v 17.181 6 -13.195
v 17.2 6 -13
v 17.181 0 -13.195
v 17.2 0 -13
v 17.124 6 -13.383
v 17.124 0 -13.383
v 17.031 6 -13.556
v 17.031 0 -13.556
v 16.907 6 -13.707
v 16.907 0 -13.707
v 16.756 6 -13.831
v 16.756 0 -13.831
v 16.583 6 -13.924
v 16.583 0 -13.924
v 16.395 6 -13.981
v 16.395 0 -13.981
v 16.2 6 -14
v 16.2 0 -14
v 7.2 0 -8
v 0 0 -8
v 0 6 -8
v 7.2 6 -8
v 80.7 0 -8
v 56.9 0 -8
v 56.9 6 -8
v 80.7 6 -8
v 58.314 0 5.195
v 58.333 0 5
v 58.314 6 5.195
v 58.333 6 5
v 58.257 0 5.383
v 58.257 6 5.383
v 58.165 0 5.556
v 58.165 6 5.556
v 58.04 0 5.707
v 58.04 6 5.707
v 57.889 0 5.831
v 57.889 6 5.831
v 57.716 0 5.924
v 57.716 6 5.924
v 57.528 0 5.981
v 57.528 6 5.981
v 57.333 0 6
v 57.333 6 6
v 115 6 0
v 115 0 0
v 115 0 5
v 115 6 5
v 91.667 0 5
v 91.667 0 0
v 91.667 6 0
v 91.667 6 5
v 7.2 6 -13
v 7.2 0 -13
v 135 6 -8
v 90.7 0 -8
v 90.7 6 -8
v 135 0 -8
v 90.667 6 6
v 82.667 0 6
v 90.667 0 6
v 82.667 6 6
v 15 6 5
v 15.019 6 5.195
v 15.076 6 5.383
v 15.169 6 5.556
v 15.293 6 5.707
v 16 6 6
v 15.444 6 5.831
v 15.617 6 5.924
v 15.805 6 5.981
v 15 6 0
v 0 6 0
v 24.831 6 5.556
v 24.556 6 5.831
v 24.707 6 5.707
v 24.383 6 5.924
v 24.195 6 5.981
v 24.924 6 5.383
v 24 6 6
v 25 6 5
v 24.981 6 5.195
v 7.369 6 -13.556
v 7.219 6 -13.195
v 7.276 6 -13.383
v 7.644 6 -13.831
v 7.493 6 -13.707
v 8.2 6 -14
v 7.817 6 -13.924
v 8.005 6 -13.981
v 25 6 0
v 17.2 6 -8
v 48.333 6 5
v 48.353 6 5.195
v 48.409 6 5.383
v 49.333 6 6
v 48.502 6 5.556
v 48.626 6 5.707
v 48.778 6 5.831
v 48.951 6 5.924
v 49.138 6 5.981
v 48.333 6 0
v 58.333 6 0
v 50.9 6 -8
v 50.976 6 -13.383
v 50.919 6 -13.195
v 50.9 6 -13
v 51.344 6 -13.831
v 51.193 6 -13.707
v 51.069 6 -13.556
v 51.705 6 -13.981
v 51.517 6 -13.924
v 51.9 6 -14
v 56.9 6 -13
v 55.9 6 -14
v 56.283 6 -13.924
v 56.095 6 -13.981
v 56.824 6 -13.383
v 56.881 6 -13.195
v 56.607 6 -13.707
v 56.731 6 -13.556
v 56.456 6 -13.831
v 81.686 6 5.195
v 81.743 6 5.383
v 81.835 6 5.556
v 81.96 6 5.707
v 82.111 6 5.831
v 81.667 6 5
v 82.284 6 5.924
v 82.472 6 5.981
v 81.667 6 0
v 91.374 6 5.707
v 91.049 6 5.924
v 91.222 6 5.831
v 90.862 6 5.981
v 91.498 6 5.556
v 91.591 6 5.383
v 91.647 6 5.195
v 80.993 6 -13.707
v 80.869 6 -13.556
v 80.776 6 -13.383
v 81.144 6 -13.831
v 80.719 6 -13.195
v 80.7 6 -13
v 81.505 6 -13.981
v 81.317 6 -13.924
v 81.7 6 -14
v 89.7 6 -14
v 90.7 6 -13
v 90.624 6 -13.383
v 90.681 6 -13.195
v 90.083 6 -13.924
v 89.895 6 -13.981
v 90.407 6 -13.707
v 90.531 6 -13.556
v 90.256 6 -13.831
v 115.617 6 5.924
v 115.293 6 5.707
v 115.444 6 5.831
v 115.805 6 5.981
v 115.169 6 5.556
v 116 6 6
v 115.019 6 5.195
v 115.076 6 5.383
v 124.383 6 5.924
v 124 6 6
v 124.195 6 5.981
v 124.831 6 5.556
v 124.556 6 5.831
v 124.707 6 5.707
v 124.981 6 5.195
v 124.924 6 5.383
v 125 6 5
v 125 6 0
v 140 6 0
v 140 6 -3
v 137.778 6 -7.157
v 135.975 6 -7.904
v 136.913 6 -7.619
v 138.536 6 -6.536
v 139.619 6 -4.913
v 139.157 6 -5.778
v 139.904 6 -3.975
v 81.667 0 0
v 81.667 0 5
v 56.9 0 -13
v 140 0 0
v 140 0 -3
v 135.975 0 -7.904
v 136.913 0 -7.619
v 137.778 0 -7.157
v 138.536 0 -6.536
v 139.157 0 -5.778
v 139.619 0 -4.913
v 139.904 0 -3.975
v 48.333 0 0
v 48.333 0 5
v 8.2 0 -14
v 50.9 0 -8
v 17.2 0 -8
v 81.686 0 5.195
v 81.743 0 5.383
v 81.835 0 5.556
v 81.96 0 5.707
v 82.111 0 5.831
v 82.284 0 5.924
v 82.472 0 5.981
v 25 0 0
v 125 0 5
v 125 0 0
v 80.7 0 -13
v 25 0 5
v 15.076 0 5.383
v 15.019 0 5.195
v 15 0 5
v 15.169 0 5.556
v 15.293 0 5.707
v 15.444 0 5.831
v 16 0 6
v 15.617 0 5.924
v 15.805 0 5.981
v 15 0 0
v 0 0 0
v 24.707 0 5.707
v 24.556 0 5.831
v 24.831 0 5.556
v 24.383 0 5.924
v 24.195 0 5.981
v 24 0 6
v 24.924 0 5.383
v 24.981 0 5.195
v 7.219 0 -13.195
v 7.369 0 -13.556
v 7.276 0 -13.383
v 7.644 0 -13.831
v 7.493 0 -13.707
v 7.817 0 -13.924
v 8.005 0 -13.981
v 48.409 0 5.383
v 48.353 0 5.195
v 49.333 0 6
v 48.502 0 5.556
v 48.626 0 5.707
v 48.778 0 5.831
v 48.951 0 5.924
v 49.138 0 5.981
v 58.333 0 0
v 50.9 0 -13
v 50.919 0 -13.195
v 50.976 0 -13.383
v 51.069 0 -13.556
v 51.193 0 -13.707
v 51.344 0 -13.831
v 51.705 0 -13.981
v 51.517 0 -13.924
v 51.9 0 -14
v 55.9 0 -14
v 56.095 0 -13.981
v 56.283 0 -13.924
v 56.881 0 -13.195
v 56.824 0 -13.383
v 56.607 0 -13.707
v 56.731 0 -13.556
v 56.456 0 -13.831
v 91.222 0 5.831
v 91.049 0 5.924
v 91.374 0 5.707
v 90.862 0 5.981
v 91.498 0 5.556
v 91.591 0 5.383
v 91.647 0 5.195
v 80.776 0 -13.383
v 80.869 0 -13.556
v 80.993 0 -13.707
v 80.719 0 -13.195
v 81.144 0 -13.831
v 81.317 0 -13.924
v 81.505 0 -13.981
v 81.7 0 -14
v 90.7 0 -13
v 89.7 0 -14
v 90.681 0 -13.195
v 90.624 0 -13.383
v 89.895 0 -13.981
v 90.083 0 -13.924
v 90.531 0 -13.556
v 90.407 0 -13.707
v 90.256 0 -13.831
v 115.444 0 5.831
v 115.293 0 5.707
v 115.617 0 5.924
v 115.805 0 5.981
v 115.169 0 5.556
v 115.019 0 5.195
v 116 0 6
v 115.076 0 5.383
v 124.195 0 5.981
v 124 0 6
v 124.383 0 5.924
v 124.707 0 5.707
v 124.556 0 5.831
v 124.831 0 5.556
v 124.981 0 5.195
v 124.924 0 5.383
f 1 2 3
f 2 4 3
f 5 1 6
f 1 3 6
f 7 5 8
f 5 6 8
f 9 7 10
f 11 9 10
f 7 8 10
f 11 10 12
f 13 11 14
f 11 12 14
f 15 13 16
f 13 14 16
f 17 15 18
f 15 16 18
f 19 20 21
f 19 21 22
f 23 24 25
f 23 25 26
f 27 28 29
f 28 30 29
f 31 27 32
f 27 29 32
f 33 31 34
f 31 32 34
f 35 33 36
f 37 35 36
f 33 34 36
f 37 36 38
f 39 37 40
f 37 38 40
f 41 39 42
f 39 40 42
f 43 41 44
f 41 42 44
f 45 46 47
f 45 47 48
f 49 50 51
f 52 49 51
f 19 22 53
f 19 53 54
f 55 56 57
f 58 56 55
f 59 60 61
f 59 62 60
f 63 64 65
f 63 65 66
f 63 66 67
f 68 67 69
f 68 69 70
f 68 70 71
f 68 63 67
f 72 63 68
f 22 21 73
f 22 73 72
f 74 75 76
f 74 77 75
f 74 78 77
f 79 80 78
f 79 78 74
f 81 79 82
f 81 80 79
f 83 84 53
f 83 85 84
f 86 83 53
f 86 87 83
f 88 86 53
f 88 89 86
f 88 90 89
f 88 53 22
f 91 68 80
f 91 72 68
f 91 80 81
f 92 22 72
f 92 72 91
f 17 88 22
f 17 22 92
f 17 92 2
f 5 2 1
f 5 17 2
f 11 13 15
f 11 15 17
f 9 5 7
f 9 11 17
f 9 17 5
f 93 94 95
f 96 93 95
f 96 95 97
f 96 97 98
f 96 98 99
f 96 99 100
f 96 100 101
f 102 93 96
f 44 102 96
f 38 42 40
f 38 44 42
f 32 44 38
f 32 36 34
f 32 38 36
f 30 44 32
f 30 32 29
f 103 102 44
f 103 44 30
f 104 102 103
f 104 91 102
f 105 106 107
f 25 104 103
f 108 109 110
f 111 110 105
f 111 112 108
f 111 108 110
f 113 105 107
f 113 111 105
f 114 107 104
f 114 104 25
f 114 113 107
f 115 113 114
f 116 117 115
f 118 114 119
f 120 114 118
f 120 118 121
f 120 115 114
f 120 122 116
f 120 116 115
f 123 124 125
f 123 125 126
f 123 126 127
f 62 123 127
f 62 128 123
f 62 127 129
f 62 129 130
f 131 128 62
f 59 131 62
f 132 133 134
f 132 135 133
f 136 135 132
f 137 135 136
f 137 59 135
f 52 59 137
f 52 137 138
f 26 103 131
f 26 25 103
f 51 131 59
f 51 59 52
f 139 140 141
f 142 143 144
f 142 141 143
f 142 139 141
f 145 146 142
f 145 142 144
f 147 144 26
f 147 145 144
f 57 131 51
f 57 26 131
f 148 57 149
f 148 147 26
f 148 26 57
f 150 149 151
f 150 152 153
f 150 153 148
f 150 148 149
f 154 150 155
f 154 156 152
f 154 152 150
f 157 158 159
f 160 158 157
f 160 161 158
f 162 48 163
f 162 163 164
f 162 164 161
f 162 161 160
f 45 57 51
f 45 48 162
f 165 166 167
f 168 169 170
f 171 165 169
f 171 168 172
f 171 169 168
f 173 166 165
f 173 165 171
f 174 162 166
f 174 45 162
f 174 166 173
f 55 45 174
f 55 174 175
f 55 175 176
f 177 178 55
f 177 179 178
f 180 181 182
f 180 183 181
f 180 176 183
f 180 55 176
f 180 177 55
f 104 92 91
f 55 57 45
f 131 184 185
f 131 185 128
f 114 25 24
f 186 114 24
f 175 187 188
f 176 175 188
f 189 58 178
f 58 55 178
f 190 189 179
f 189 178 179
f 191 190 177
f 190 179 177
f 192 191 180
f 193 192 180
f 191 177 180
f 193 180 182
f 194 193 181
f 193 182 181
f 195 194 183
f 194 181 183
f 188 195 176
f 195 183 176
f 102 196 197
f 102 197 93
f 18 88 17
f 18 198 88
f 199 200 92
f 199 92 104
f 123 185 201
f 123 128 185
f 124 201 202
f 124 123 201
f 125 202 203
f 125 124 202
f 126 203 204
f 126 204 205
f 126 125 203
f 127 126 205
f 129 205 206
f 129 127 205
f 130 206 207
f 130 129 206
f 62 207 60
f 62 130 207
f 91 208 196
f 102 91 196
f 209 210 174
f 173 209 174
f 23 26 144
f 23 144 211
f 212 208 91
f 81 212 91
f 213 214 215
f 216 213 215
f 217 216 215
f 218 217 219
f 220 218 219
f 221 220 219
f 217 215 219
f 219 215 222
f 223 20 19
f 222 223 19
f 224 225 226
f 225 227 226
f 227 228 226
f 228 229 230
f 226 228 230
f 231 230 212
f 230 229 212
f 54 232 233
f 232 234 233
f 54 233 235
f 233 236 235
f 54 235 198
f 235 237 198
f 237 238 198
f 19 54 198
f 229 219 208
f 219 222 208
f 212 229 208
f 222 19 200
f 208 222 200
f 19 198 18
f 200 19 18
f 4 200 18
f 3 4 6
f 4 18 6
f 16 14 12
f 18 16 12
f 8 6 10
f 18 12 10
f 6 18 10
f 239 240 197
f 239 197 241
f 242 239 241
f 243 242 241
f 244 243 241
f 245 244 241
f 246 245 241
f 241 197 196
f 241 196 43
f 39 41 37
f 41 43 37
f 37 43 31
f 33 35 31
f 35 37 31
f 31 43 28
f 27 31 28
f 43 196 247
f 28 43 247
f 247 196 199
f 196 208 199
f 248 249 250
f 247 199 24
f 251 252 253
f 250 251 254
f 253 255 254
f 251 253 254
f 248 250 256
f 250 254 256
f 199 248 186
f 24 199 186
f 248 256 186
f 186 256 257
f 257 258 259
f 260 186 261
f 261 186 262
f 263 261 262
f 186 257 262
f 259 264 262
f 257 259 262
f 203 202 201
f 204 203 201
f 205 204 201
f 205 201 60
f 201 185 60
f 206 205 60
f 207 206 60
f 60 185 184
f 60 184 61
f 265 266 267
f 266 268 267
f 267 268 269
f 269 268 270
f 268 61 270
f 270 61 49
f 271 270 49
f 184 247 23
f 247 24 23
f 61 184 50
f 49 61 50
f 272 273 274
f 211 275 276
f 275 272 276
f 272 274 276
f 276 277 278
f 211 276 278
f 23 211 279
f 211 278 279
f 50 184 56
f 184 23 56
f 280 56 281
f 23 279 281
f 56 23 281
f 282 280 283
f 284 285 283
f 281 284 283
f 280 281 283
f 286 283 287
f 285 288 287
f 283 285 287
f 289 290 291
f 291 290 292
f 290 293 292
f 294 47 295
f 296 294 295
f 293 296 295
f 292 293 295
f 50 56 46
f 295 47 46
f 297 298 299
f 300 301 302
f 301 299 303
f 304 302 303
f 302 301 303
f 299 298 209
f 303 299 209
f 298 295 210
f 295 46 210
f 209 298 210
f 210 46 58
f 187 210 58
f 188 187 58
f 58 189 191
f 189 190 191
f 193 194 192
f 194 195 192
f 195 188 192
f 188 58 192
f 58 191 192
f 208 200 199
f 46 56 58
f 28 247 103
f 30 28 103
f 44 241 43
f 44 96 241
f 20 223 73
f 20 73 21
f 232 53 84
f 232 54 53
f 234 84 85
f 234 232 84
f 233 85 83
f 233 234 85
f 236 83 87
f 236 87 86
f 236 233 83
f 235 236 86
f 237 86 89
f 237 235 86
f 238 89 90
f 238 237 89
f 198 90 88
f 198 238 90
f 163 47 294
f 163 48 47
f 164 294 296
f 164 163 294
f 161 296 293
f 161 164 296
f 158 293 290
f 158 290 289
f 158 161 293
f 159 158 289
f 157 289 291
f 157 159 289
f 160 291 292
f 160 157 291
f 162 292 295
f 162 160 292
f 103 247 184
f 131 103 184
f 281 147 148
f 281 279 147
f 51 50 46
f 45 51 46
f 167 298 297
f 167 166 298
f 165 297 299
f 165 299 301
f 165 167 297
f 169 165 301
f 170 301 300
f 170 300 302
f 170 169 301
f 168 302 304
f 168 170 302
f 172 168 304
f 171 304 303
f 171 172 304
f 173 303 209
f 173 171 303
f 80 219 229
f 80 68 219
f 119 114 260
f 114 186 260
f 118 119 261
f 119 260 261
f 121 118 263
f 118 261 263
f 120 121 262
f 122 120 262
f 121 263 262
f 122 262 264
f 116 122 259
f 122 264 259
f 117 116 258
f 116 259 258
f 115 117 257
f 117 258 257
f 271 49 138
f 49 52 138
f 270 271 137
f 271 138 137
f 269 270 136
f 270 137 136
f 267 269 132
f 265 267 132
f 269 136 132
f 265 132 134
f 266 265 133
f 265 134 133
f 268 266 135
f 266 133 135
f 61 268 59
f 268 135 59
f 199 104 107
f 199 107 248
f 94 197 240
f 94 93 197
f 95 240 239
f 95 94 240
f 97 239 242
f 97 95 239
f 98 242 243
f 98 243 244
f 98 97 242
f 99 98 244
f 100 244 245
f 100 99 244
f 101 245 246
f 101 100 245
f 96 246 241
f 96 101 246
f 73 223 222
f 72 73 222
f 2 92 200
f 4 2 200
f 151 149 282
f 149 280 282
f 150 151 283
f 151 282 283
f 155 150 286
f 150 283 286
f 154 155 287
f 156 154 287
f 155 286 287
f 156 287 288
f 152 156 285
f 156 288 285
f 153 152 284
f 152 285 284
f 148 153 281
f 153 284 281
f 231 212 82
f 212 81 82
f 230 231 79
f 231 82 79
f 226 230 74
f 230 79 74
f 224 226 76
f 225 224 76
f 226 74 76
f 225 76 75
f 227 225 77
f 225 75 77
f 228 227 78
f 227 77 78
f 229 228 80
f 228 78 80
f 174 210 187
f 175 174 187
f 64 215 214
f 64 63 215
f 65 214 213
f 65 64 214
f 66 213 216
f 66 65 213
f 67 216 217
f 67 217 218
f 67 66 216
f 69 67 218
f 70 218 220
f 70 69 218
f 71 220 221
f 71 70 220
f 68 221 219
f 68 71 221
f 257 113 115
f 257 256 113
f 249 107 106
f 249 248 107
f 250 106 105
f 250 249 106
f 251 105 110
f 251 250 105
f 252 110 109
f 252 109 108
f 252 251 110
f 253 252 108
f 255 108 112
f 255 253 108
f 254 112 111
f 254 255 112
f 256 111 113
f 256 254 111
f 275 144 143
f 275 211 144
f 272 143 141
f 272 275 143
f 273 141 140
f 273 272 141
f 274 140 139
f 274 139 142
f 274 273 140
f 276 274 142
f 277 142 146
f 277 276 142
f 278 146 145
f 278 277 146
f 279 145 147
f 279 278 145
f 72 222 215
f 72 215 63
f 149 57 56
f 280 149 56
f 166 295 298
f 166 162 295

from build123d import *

# Parameters (mm, degrees)
SKETCH1_W               = 140
SKETCH1_H               = 8
BOSS_EXTRUDE1_DEPTH     = 6
SKETCH234_W             = 10
SKETCH234_H             = 6
BOSS_EXTRUDE234_DEPTH   = 6
FILLET134_R             = 1
SKETCH2341_W            = 10
SKETCH2341_H            = 6
BOSS_EXTRUDE2341_DEPTH  = 6
FILLET1341_R            = 1
SKETCH2342_W            = 10
SKETCH2342_H            = 6
BOSS_EXTRUDE2342_DEPTH  = 6
FILLET1342_R            = 1
SKETCH2343_W            = 10
SKETCH2343_H            = 6
BOSS_EXTRUDE2343_DEPTH  = 6
FILLET1343_R            = 1
SKETCH2344_W            = 10
SKETCH2344_H            = 6
BOSS_EXTRUDE2344_DEPTH  = 6
FILLET1344_R            = 1
SKETCH2346_W            = 10
SKETCH2346_H            = 6
BOSS_EXTRUDE2346_DEPTH  = 6
FILLET1346_R            = 1
FILLET1347_R            = 5
SKETCH23410_W           = 6
SKETCH23410_H           = 6
BOSS_EXTRUDE23410_DEPTH = 6
FILLET13411_R           = 1


with BuildPart() as part:
    # Sketch1 → Boss-Extrude1 (new body)
    with BuildSketch(Plane(origin=(0, 0, 0), x_dir=(1, 0, 0), z_dir=(0, 1, 0))):
        with Locations((70, 4)):
            Rectangle(SKETCH1_W, SKETCH1_H)
    extrude(amount=BOSS_EXTRUDE1_DEPTH)

    # Sketch234 → Boss-Extrude234 (add)
    with BuildSketch(Plane(origin=(119.232221392, 0, 0), x_dir=(1, 0, 0), z_dir=(0, 0, 1))):
        with Locations((0.767778608, 3)):
            Rectangle(SKETCH234_W, SKETCH234_H)
    extrude(amount=BOSS_EXTRUDE234_DEPTH)

    # Fillet134
    fillet134_edges = [part.edges().sort_by_distance(p)[0] for p in [
        (115, 3, 6),
        (125, 3, 6),
    ]]
    fillet(fillet134_edges, radius=FILLET134_R)

    # Sketch2341 → Boss-Extrude2341 (add)
    with BuildSketch(Plane(origin=(85.898888059, 0, 0), x_dir=(1, 0, 0), z_dir=(0, 0, 1))):
        with Locations((0.767778608, 3)):
            Rectangle(SKETCH2341_W, SKETCH2341_H)
    extrude(amount=BOSS_EXTRUDE2341_DEPTH)

    # Fillet1341
    fillet1341_edges = [part.edges().sort_by_distance(p)[0] for p in [
        (91.666666667, 3, 6),
        (81.666666667, 3, 6),
    ]]
    fillet(fillet1341_edges, radius=FILLET1341_R)

    # Sketch2342 → Boss-Extrude2342 (add)
    with BuildSketch(Plane(origin=(52.565554726, 0, 0), x_dir=(1, 0, 0), z_dir=(0, 0, 1))):
        with Locations((0.767778608, 3)):
            Rectangle(SKETCH2342_W, SKETCH2342_H)
    extrude(amount=BOSS_EXTRUDE2342_DEPTH)

    # Fillet1342
    fillet1342_edges = [part.edges().sort_by_distance(p)[0] for p in [
        (58.333333333, 3, 6),
        (48.333333333, 3, 6),
    ]]
    fillet(fillet1342_edges, radius=FILLET1342_R)

    # Sketch2343 → Boss-Extrude2343 (add)
    with BuildSketch(Plane(origin=(19.232221392, 0, 0), x_dir=(1, 0, 0), z_dir=(0, 0, 1))):
        with Locations((0.767778608, 3)):
            Rectangle(SKETCH2343_W, SKETCH2343_H)
    extrude(amount=BOSS_EXTRUDE2343_DEPTH)

    # Fillet1343
    fillet1343_edges = [part.edges().sort_by_distance(p)[0] for p in [
        (25, 3, 6),
        (15, 3, 6),
    ]]
    fillet(fillet1343_edges, radius=FILLET1343_R)

    # Sketch2344 → Boss-Extrude2344 (add)
    with BuildSketch(Plane(origin=(84.932221392, 6, -8), x_dir=(1, 0, 0), z_dir=(0, 0, -1))):
        with Locations((0.767778608, 3)):
            Rectangle(SKETCH2344_W, SKETCH2344_H)
    extrude(amount=BOSS_EXTRUDE2344_DEPTH)

    # Fillet1344
    fillet1344_edges = [part.edges().sort_by_distance(p)[0] for p in [
        (80.7, 3, -14),
        (90.7, 3, -14),
    ]]
    fillet(fillet1344_edges, radius=FILLET1344_R)

    # Sketch2346 → Boss-Extrude2346 (add)
    with BuildSketch(Plane(origin=(11.432221392, 6, -8), x_dir=(1, 0, 0), z_dir=(0, 0, -1))):
        with Locations((0.767778608, 3)):
            Rectangle(SKETCH2346_W, SKETCH2346_H)
    extrude(amount=BOSS_EXTRUDE2346_DEPTH)

    # Fillet1346
    fillet1346_edges = [part.edges().sort_by_distance(p)[0] for p in [
        (17.2, 3, -14),
        (7.2, 3, -14),
    ]]
    fillet(fillet1346_edges, radius=FILLET1346_R)

    # Fillet1347
    fillet1347_edges = [part.edges().sort_by_distance(p)[0] for p in [
        (140, 3, -8),
    ]]
    fillet(fillet1347_edges, radius=FILLET1347_R)

    # Sketch23410 → Boss-Extrude23410 (add)
    with BuildSketch(Plane(origin=(53.132221392, 6, -8), x_dir=(1, 0, 0), z_dir=(0, 0, -1))):
        with Locations((0.767778608, 3)):
            Rectangle(SKETCH23410_W, SKETCH23410_H)
    extrude(amount=BOSS_EXTRUDE23410_DEPTH)

    # Fillet13411
    fillet13411_edges = [part.edges().sort_by_distance(p)[0] for p in [
        (56.9, 3, -14),
        (50.9, 3, -14),
    ]]
    fillet(fillet13411_edges, radius=FILLET13411_R)


solid = part.part
